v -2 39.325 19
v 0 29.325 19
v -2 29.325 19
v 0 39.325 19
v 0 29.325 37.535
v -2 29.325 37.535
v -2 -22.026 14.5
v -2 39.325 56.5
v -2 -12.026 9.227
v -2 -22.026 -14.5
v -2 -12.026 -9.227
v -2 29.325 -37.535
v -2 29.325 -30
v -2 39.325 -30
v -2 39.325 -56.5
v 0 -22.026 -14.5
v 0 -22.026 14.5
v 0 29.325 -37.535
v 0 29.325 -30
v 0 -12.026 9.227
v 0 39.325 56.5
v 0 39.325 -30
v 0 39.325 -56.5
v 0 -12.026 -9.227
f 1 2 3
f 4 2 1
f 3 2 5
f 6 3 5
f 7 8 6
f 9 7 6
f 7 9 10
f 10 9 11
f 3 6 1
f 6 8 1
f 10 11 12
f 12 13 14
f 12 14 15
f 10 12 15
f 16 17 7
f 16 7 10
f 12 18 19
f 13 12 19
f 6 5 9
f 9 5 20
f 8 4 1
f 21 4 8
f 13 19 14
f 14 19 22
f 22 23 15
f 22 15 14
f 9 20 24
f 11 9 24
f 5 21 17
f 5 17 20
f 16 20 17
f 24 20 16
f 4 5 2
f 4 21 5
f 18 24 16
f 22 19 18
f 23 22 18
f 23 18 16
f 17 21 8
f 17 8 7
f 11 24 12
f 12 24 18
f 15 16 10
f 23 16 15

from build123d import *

# Parameters (mm, degrees)
BASE_FLANGE1_DEPTH = 2
SKETCH6_W          = 49
SKETCH6_H          = 16.635259071
CUT_EXTRUDE1_DEPTH = 49


# Sheet-metal steps are written as plain solids
with BuildPart() as part:
    # Sketch1 → Base-Flange1 (new body)
    with BuildSketch(Plane(origin=(0, 0, 0), x_dir=(0, 0, -1), z_dir=(1, 0, 0))):
        Polygon((-14.5, -22.025862069), (14.5, -22.025862069), (56.5, 39.324712644), (-56.5, 39.324712644), align=None)
        Polygon((-9.227058078, -12.025862069), (9.227058078, -12.025862069), (37.5352548, 29.324712644), (-37.5352548, 29.324712644), align=None, mode=Mode.SUBTRACT)
    extrude(amount=-BASE_FLANGE1_DEPTH)

    # Sketch6 → Cut-Extrude1 (cut)
    with BuildSketch(Plane(origin=(0, 0, 0), x_dir=(0, 0, -1), z_dir=(1, 0, 0))):
        with Locations((5.5, 37.409748974)):
            Rectangle(SKETCH6_W, SKETCH6_H)
    extrude(amount=-CUT_EXTRUDE1_DEPTH, mode=Mode.SUBTRACT)


solid = part.part
